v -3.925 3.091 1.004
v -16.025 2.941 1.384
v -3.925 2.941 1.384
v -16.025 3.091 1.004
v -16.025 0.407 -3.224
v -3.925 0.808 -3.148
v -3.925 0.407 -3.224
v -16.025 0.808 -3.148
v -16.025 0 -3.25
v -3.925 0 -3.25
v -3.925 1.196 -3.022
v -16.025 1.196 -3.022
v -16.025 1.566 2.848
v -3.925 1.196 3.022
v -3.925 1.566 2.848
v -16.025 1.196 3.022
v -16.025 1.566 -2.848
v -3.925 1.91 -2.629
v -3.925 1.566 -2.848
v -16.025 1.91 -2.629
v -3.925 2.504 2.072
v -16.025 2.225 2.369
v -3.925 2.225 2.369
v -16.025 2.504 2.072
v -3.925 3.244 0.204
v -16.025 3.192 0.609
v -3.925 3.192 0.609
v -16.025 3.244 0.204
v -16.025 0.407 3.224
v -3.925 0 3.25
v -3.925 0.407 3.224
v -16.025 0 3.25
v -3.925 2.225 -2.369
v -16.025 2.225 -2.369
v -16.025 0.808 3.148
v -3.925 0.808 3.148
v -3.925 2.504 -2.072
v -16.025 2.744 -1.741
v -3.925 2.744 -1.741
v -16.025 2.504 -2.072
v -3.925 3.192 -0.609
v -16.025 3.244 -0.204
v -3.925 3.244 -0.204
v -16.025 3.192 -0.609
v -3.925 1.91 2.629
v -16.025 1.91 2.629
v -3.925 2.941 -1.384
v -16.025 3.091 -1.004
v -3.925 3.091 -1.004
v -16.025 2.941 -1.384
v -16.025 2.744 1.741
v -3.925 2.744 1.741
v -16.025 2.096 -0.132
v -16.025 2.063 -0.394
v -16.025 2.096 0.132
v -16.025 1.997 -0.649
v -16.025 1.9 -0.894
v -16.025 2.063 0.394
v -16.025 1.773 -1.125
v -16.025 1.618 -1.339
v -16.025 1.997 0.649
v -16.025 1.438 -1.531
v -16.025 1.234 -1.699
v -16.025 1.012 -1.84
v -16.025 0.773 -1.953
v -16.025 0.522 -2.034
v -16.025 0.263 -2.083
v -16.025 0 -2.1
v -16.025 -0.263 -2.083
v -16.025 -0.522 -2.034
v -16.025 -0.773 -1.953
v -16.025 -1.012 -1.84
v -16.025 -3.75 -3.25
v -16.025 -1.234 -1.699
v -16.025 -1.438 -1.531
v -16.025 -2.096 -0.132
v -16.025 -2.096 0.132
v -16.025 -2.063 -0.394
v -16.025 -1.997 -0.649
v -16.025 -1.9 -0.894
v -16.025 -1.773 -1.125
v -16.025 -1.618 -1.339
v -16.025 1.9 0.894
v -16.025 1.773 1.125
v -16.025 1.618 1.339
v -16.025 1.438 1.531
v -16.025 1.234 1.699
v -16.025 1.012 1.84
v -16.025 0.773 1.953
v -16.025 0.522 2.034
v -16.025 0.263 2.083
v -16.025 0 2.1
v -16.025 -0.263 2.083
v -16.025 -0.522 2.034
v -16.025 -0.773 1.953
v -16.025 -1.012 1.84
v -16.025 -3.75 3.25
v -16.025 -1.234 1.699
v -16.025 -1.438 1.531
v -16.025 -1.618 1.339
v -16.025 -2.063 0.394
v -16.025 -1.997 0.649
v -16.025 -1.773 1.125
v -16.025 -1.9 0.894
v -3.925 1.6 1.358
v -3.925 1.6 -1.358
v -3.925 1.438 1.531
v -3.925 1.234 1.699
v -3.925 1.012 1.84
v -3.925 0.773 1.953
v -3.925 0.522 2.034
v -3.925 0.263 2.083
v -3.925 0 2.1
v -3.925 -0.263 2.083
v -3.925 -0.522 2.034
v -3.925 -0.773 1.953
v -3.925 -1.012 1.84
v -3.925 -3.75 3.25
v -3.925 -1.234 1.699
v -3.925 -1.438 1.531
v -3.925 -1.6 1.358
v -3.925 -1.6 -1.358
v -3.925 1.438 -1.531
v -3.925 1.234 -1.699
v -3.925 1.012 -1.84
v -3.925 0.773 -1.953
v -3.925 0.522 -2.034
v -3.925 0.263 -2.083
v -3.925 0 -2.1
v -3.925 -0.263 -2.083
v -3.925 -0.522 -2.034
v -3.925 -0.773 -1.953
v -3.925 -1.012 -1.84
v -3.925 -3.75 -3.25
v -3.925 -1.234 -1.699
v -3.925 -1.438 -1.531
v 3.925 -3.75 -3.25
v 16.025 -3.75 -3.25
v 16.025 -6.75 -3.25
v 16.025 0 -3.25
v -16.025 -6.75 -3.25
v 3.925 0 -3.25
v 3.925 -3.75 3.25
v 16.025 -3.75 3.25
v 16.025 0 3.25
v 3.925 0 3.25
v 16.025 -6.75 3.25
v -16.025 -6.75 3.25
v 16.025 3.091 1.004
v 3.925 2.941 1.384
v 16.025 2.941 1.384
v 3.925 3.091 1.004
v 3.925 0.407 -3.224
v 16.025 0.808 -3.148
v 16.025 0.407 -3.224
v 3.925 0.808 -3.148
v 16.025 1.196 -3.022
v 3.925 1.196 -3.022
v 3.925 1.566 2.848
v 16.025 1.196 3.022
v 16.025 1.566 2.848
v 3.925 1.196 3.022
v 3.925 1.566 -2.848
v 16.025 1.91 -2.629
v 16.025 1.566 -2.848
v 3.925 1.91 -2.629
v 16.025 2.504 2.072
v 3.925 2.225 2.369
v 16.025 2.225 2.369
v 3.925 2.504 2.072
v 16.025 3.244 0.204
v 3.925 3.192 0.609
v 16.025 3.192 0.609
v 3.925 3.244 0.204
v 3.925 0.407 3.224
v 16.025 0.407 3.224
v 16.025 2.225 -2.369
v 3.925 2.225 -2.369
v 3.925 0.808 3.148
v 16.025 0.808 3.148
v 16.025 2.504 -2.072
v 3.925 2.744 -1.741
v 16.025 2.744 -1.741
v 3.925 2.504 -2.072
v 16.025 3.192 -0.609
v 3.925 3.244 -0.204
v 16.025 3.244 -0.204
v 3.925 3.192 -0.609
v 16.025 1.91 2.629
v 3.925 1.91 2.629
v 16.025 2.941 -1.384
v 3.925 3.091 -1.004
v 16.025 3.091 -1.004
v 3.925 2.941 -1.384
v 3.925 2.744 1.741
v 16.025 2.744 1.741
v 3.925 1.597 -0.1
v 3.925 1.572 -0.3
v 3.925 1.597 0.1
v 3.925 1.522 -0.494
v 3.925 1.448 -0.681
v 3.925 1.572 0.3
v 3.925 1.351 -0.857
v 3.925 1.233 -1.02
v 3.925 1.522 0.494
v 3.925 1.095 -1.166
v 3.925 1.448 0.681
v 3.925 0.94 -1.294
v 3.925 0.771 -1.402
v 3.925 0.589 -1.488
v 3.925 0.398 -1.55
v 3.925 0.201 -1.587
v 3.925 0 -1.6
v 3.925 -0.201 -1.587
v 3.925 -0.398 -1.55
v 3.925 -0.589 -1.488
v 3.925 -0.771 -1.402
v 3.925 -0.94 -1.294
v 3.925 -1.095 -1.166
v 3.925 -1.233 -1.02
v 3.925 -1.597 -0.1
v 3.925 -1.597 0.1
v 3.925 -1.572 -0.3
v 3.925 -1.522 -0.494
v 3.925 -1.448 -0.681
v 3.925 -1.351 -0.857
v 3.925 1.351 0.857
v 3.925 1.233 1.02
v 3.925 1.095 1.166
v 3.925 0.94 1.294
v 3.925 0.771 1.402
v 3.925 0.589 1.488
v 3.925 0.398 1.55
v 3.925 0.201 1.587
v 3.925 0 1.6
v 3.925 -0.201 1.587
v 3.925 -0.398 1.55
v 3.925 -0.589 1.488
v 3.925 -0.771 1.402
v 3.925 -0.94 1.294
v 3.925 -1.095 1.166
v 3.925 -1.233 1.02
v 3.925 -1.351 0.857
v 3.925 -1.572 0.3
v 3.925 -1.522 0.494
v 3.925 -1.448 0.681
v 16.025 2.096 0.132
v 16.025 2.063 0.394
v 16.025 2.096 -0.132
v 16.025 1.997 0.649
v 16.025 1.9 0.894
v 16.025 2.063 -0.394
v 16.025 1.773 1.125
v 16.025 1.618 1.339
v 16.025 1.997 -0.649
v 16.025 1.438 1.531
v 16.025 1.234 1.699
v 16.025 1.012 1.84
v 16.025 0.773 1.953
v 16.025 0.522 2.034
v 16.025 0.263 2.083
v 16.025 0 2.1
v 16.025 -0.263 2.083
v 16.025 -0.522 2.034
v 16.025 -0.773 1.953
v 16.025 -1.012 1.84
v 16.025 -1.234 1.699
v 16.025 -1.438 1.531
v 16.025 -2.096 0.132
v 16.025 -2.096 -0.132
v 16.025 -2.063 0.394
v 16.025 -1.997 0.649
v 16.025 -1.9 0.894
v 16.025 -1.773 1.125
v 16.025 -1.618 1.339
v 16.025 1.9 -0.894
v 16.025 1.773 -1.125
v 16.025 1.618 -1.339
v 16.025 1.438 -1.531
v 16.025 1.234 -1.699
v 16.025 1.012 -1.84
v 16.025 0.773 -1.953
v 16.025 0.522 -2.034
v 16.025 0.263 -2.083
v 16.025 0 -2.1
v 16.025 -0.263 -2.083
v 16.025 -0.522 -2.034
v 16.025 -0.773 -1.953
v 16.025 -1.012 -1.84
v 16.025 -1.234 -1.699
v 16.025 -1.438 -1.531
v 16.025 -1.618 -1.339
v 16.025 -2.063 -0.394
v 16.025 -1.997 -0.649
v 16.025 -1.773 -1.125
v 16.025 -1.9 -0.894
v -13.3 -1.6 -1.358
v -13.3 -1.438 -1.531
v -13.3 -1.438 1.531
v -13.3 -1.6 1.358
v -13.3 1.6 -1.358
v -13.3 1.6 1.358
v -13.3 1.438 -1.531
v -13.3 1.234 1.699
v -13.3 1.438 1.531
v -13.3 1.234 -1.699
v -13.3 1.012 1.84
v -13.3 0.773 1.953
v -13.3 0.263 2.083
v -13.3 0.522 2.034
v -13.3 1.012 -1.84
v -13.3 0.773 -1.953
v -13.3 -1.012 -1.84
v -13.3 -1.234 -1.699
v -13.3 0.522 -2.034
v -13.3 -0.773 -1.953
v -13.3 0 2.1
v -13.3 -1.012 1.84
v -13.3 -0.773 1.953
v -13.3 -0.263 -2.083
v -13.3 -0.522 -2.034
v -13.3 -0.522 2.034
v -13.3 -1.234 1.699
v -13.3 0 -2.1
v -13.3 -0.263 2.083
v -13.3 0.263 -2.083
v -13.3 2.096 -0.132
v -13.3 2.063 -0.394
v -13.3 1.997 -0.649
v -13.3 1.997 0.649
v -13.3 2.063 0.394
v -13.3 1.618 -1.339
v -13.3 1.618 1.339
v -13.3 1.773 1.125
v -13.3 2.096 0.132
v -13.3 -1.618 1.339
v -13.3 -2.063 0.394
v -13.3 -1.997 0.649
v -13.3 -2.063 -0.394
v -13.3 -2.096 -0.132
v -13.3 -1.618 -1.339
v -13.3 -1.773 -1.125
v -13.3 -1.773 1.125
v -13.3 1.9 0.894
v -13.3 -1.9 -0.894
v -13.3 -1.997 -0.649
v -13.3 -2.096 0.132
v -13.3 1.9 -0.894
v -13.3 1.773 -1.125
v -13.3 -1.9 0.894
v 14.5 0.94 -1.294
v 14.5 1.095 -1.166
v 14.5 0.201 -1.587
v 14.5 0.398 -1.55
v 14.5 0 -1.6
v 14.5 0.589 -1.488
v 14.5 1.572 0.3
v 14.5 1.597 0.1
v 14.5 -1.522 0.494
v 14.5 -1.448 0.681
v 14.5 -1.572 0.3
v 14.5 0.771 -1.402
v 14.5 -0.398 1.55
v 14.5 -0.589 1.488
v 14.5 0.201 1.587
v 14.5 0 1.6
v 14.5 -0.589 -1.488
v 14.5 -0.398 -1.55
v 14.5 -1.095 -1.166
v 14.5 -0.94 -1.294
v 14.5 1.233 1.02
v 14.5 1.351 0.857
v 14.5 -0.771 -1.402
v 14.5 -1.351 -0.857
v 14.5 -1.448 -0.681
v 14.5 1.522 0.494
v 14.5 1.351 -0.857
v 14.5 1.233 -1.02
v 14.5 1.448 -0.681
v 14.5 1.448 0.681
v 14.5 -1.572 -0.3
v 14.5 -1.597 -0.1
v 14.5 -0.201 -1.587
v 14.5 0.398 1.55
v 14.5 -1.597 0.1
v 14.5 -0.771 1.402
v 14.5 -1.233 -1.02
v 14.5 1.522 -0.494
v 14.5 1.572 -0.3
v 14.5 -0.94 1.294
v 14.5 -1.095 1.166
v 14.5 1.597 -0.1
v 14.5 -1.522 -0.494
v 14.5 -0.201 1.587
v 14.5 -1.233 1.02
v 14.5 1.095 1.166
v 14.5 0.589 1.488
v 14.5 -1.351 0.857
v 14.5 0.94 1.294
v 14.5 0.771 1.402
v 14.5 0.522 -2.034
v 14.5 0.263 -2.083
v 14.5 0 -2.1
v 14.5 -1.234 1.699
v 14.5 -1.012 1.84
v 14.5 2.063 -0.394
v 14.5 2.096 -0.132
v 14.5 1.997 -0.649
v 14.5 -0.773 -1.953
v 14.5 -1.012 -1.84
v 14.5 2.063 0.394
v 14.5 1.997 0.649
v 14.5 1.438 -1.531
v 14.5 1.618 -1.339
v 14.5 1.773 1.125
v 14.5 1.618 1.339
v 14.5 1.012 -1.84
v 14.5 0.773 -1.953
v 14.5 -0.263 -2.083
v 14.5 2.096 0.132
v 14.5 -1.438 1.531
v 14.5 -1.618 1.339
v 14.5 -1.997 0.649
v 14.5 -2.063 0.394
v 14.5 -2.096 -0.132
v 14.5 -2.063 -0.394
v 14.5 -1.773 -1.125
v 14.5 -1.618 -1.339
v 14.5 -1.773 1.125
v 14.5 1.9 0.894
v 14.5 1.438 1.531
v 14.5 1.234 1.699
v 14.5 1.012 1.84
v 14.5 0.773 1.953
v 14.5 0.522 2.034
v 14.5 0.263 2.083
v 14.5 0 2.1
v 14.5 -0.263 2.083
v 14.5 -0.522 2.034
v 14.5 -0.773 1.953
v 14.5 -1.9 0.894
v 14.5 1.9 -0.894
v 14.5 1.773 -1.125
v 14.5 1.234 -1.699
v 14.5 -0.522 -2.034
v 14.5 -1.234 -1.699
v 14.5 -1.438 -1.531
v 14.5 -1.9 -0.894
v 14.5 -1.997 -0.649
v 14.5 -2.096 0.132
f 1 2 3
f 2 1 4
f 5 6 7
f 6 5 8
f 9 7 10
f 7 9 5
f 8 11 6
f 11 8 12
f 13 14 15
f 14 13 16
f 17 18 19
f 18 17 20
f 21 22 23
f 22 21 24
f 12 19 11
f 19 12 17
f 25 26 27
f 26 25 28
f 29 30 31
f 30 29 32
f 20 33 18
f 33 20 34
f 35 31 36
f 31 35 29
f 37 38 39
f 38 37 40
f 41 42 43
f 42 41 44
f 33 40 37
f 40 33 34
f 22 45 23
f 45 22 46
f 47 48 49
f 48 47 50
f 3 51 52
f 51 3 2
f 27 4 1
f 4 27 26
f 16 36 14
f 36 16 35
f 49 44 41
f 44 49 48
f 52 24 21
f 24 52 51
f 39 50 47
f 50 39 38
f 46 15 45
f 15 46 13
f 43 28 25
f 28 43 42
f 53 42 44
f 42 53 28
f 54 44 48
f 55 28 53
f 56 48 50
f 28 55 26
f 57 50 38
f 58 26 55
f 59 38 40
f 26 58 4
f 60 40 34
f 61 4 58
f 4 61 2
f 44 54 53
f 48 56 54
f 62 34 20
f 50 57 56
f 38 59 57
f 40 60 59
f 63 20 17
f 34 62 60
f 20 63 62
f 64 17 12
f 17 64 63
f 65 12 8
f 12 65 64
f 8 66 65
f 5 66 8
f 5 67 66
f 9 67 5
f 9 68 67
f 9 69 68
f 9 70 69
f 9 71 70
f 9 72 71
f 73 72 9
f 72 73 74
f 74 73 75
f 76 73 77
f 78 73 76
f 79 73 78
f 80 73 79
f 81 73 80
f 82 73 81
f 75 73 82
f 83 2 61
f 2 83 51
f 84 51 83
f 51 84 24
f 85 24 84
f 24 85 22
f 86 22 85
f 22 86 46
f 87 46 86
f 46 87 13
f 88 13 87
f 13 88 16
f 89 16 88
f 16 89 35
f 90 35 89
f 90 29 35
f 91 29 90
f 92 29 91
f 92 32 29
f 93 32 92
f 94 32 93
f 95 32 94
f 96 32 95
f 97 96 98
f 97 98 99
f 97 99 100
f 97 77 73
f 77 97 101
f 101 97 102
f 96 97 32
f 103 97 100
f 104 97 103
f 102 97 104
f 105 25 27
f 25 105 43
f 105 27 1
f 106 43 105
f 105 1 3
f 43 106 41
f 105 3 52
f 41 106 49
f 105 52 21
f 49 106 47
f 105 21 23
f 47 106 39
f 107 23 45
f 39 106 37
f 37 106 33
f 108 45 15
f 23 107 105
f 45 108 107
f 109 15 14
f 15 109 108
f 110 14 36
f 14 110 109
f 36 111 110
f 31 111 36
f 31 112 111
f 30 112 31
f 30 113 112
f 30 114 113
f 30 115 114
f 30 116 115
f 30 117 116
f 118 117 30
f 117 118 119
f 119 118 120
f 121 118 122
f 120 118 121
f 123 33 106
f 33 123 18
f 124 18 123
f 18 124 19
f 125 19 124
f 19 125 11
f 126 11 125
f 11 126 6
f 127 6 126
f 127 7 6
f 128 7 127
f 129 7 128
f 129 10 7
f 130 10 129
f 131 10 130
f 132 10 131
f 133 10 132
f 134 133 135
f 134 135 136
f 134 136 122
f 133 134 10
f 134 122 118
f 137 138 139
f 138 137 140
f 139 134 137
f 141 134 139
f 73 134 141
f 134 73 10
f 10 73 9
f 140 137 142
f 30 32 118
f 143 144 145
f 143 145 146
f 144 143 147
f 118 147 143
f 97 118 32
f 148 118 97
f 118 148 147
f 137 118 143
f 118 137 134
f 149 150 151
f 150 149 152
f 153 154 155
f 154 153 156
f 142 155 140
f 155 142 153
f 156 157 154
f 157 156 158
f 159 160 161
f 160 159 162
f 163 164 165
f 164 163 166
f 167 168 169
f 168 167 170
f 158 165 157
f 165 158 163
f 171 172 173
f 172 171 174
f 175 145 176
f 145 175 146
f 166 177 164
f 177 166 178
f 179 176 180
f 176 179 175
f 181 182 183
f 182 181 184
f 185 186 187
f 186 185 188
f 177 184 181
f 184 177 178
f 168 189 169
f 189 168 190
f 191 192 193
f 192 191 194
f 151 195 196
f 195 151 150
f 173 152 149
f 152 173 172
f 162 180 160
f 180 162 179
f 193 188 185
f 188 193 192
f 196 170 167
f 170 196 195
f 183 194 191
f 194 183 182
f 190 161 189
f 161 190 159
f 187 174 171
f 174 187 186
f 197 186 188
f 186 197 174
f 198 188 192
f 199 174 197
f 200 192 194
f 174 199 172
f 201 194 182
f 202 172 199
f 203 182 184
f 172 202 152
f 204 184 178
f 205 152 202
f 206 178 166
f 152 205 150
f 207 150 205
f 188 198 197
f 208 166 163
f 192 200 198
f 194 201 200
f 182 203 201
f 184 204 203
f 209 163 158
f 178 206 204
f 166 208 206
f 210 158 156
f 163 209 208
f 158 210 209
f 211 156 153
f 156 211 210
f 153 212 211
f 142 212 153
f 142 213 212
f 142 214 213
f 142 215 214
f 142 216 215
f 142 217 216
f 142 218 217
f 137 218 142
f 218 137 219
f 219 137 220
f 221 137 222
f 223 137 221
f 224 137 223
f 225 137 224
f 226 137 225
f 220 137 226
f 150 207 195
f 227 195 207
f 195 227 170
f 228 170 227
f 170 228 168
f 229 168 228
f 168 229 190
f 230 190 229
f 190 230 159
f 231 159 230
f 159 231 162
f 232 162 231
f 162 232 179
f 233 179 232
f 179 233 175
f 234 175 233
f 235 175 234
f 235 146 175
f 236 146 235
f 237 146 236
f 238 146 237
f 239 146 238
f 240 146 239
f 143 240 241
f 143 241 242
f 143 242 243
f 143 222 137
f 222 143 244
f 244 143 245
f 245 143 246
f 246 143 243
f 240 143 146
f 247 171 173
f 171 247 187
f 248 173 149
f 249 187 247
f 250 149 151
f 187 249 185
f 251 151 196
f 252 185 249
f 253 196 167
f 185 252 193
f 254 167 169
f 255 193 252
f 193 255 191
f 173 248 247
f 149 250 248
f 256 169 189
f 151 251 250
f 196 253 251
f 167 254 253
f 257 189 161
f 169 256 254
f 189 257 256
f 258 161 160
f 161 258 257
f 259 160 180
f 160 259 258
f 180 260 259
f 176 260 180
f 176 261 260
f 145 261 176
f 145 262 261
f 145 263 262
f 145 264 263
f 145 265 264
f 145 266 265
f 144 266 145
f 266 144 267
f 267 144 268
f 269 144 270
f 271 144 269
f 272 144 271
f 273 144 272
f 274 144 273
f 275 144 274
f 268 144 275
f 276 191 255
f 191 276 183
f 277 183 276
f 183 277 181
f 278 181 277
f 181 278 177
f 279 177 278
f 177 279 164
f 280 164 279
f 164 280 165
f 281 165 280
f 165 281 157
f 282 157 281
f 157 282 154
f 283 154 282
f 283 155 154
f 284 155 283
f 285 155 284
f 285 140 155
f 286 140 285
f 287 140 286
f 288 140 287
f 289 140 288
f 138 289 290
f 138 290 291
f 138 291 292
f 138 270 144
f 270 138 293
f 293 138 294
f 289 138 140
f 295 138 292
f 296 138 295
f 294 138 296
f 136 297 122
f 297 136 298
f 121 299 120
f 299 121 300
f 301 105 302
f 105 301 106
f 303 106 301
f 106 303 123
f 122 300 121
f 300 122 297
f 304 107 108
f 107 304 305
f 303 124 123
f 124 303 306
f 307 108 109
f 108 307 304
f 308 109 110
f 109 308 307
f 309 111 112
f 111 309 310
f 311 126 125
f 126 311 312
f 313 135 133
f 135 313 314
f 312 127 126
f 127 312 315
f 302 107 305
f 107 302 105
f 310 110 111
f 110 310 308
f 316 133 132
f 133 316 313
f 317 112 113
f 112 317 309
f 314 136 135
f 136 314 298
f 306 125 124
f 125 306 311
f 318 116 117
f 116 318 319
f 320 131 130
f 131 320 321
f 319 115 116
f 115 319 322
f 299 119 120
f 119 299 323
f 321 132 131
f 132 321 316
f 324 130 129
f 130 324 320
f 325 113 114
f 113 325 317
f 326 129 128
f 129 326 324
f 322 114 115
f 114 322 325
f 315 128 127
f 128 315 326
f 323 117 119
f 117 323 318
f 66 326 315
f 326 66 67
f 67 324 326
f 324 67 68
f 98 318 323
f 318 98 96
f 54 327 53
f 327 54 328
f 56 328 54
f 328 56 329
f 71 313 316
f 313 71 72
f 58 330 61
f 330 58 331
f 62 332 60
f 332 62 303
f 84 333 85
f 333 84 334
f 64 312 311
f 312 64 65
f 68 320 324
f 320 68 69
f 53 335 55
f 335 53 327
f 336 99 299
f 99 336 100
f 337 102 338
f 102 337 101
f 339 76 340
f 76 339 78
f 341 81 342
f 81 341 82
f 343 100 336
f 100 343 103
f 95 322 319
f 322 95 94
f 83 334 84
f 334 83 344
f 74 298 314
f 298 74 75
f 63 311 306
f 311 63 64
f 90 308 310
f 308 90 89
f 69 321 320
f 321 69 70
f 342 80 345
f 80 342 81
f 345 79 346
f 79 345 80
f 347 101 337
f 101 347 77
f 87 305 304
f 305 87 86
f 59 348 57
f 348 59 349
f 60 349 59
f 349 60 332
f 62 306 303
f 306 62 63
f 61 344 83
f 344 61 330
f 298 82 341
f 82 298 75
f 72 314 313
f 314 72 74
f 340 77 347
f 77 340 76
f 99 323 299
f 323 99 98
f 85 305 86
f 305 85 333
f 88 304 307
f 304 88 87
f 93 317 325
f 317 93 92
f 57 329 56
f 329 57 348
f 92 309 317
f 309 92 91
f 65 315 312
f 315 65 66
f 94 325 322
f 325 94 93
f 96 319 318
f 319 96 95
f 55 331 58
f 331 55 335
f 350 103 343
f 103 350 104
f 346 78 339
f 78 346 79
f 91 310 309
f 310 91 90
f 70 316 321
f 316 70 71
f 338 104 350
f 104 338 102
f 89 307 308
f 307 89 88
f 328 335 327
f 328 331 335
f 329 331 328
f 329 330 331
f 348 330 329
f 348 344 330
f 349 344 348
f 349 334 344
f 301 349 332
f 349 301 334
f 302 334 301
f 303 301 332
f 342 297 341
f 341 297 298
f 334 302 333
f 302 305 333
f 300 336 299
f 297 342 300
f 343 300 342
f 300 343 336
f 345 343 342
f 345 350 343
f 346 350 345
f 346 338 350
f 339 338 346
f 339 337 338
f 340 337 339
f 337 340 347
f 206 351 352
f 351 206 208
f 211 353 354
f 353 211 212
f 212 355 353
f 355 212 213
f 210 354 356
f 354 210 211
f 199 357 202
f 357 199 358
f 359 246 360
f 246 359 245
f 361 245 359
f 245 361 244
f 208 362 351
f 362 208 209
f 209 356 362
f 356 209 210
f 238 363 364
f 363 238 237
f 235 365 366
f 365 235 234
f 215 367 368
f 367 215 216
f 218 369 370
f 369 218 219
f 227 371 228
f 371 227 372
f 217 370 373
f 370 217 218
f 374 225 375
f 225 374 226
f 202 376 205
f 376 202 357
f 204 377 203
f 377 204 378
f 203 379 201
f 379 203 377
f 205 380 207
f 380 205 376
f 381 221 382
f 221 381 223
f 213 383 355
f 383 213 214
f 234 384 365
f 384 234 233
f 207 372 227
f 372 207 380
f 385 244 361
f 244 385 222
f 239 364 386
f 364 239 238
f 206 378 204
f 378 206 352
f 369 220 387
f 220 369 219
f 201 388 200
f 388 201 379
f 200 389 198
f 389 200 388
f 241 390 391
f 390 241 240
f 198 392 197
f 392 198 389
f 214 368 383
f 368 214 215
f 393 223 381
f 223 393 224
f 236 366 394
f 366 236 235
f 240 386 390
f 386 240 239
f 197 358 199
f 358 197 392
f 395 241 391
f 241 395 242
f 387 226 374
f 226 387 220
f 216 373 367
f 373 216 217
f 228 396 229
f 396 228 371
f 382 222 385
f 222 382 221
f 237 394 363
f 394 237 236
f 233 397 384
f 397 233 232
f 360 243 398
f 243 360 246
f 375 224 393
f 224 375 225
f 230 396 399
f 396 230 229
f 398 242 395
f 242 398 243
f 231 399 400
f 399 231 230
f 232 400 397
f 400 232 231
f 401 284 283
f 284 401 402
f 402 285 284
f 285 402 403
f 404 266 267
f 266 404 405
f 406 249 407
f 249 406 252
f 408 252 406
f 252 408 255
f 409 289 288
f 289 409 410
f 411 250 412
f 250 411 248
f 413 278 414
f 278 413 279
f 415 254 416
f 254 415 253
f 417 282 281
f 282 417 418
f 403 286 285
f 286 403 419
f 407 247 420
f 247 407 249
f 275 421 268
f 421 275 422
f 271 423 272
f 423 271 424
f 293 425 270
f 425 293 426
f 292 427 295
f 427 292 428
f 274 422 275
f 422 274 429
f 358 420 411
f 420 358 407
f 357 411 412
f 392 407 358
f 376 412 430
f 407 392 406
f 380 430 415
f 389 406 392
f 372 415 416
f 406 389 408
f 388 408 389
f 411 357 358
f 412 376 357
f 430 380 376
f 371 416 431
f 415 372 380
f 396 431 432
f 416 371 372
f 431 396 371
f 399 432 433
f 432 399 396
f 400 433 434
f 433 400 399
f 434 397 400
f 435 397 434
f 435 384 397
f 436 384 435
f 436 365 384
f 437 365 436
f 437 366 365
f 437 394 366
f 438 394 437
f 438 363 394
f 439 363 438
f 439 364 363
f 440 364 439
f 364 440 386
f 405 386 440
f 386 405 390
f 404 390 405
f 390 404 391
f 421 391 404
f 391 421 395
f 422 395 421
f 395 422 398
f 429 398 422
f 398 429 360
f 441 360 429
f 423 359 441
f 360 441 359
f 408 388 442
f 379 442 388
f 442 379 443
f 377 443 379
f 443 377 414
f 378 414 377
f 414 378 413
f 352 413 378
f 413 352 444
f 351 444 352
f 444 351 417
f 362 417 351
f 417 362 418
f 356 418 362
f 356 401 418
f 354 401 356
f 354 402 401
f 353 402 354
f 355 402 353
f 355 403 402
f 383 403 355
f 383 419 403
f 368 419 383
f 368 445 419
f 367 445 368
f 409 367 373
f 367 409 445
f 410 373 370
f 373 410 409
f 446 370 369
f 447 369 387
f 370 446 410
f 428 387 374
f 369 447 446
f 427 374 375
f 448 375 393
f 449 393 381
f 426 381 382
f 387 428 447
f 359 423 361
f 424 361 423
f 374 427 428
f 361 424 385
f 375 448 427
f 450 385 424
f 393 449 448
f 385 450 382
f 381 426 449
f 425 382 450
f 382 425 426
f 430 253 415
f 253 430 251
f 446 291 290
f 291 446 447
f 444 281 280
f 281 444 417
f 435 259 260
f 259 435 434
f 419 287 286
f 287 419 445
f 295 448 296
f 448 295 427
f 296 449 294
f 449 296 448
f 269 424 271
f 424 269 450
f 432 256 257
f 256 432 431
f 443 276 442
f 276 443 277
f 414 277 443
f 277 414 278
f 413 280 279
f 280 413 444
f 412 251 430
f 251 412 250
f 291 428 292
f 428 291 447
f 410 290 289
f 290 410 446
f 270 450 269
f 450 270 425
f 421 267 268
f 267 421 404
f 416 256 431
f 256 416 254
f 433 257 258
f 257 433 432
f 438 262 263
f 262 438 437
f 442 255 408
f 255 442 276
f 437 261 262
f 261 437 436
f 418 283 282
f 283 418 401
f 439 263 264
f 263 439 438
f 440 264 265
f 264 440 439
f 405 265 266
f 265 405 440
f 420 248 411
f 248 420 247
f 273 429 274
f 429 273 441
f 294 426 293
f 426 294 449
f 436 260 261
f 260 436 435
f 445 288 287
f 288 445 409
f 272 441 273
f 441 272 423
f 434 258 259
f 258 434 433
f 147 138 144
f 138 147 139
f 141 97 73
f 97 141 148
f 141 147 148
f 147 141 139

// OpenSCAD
// Logitech Brio 100/105 Mount
// Instructions:
// Remove the small caps on the axis
// Remove screw on the right side of the cam (cable site, PH00)
// Push out axle with small screwdriver 

/* [Axle] */
axDia=3;
axLen=29.1;
axHeadThck=1.2;
axHeadDia=4;
axScrewHoleDia=1.5;
axScrewHoleLen=3.5;
axSpcng=0.1;

/* [Interface] */
intOutSegmWdth=12.1;
intInSegmWdth=7.85;
intSegmDia=6.5;
intDist=0.5;
intLedgeDims=[0.7,0.8];

/* [Hidden] */
fudge=0.1;
$fn=50;

intOvLen=intOutSegmWdth*2+intInSegmWdth;
axOffset=(intOvLen-axLen)/2;

*brioAxle();
module brioAxle(){
  difference(){
    union(){
      cylinder(d=axDia,h=axLen);
      cylinder(d=axHeadDia,h=axHeadThck);
      linear_extrude(intOutSegmWdth-axOffset) intersection(){
         square([axHeadDia,axDia],true);
         circle(d=axHeadDia);
       }
     }
    #translate([0,0,axLen-axScrewHoleLen]) cylinder(d=axScrewHoleDia,h=axScrewHoleLen+fudge);
  }
}

brioInterface();
translate([0,-intSegmDia/2-3/2-intDist,0]) cube([intOvLen,3,intSegmDia],true);

module brioInterface(){
  rotate([0,90,0]) difference(){
    for (iz=[-1,1])
      translate([0,0,iz*(intInSegmWdth+intOutSegmWdth)/2]){
        cylinder(d=intSegmDia,h=intOutSegmWdth,center=true);
        translate([0,-(intSegmDia/2+intDist)/2,0]) cube([intSegmDia,intSegmDia/2+intDist,intOutSegmWdth],true);
      }
    
    cylinder(d=axDia+axSpcng*2,h=intOvLen+fudge,center=true);
    translate([0,0,-(intOvLen+fudge)/2]){
      linear_extrude(intOutSegmWdth+fudge) intersection(){
        square([axHeadDia+axSpcng*2,axDia+axSpcng*2],true);
        circle(d=axHeadDia+axSpcng*2);
      }
      cylinder(d=axHeadDia+axSpcng*2,h=axOffset+axHeadThck+axSpcng);
    }
    translate([0,0,(intOvLen+fudge)/2-(axOffset+axSpcng)]) cylinder(d=axHeadDia+axSpcng*2,h=axOffset+axSpcng);
  }
}
